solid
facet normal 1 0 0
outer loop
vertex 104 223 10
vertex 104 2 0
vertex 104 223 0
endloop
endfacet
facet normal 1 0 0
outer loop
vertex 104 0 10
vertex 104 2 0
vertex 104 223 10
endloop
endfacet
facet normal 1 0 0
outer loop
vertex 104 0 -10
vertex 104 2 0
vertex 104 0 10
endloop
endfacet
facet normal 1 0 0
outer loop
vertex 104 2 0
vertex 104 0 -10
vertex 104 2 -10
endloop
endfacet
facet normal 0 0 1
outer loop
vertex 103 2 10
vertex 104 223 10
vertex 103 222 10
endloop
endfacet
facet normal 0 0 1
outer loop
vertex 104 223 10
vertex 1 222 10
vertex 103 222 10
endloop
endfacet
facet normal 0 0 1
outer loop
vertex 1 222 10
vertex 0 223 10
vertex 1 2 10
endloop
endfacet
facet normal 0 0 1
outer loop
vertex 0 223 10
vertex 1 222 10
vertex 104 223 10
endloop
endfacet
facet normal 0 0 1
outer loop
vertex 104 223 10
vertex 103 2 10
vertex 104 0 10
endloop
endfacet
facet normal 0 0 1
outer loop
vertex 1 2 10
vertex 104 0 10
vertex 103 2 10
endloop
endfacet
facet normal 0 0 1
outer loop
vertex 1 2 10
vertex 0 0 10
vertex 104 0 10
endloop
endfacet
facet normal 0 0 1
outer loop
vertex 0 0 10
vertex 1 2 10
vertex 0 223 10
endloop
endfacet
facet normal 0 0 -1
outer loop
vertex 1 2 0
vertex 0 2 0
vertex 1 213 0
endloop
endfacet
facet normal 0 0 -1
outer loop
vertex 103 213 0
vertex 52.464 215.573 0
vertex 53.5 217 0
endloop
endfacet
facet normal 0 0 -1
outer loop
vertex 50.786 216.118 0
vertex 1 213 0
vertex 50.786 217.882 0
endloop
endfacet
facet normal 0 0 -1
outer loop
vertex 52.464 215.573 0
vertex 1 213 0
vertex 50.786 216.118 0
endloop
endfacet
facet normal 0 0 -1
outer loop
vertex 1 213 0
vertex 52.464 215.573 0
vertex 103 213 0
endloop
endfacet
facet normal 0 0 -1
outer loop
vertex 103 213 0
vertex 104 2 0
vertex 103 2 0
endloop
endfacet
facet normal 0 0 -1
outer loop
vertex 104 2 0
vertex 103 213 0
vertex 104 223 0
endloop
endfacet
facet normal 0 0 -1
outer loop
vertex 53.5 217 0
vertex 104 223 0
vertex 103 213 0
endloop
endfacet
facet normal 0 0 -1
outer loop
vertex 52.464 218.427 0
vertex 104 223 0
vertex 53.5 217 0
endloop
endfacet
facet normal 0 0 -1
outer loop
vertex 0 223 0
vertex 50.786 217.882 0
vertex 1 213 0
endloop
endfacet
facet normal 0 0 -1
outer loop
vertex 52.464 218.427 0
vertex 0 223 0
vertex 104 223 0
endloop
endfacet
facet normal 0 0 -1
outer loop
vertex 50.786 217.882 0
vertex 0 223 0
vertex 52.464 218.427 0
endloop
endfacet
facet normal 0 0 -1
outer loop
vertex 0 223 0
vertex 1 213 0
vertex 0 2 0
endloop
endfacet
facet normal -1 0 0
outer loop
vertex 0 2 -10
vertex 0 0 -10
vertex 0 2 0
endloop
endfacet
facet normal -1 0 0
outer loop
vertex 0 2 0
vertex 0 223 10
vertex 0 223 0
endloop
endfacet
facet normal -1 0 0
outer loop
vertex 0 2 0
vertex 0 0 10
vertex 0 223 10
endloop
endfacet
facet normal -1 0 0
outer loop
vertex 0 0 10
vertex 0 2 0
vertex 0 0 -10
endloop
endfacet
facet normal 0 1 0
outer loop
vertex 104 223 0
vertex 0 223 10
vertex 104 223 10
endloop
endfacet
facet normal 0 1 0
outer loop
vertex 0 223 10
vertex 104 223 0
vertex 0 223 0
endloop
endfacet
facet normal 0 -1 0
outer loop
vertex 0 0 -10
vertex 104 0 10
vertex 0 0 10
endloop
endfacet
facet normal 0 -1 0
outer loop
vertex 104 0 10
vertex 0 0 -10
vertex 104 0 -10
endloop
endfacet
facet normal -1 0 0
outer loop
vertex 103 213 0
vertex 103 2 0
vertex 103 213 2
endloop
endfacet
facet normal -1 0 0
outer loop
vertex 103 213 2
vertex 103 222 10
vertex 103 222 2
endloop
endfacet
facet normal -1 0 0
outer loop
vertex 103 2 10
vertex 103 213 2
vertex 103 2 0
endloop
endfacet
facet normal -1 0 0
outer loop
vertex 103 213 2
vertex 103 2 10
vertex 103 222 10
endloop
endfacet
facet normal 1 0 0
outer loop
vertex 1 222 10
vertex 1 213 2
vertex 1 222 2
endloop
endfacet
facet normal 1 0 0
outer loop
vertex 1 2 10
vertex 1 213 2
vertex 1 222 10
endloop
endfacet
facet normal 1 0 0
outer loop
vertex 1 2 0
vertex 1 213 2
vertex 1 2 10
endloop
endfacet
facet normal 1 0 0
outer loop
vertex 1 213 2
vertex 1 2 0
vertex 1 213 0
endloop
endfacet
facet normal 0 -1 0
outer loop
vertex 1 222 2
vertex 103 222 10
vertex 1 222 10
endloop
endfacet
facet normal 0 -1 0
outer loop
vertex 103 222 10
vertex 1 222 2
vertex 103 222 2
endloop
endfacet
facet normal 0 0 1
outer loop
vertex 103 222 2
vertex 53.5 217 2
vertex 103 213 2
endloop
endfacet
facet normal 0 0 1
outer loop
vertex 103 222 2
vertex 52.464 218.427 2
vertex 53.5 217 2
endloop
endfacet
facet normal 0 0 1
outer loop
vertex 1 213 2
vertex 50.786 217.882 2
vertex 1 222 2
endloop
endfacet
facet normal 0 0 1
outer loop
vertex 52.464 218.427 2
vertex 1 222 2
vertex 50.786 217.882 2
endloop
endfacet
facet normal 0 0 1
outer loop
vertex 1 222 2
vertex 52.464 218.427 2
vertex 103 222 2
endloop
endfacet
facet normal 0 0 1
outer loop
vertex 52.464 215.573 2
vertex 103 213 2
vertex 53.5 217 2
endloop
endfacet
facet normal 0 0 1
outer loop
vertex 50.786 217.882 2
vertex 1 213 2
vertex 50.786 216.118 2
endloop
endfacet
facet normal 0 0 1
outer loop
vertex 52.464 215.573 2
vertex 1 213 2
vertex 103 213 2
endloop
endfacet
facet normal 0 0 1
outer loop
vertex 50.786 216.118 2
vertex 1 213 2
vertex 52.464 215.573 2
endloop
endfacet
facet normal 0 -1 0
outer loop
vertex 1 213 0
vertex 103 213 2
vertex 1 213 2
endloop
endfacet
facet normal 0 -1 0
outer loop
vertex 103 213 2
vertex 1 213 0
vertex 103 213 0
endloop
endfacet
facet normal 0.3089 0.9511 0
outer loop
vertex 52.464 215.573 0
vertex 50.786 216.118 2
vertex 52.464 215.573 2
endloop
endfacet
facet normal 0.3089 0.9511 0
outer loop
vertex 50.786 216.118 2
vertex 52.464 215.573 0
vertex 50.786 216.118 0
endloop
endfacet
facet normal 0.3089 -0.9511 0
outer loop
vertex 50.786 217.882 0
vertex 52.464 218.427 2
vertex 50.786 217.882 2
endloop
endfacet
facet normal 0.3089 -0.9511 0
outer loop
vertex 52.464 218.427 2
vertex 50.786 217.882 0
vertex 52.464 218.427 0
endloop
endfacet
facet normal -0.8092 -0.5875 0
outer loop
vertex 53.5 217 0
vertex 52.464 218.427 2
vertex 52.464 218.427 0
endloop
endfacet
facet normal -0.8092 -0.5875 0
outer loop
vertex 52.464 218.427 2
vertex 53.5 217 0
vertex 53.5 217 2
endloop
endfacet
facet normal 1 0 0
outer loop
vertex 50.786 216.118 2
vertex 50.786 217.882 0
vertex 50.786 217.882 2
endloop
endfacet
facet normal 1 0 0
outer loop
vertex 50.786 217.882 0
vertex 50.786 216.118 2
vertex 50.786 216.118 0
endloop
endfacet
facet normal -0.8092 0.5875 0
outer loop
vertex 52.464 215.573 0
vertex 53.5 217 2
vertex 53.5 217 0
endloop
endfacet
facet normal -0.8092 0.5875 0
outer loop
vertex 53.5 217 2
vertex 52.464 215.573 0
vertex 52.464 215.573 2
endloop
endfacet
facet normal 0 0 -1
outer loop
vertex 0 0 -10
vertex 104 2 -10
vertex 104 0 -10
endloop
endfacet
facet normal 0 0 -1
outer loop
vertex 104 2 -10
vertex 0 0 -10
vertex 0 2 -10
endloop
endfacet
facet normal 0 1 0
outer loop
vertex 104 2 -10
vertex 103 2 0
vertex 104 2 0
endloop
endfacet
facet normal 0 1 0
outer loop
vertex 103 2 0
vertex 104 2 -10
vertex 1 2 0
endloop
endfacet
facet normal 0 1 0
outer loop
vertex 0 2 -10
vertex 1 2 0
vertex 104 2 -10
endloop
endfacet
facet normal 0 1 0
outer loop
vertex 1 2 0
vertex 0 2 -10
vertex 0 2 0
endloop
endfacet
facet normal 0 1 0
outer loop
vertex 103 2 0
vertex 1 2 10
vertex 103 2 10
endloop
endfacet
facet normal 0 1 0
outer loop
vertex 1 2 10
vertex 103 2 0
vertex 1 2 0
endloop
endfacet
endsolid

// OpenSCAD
//should be parametric
//trying to make 3D printable
//extension for A07 MITX case

pLength = 10;

mainHeight = 223;
mainWidth = 104;

brimSize = 10;

difference(){
    cube([mainWidth, mainHeight, pLength]);
    translate([1,1,0])cube([mainWidth-2, mainHeight-2, pLength+2]);
};
difference() {
    translate([0,mainHeight-10,0])cube([mainWidth, 10, 2]);
    translate([mainWidth/2,mainHeight-1-brimSize/2,-1])cylinder(h=10,d=3,center=true);
};
translate([0,0,-pLength])cube([mainWidth,2,pLength+10]);
